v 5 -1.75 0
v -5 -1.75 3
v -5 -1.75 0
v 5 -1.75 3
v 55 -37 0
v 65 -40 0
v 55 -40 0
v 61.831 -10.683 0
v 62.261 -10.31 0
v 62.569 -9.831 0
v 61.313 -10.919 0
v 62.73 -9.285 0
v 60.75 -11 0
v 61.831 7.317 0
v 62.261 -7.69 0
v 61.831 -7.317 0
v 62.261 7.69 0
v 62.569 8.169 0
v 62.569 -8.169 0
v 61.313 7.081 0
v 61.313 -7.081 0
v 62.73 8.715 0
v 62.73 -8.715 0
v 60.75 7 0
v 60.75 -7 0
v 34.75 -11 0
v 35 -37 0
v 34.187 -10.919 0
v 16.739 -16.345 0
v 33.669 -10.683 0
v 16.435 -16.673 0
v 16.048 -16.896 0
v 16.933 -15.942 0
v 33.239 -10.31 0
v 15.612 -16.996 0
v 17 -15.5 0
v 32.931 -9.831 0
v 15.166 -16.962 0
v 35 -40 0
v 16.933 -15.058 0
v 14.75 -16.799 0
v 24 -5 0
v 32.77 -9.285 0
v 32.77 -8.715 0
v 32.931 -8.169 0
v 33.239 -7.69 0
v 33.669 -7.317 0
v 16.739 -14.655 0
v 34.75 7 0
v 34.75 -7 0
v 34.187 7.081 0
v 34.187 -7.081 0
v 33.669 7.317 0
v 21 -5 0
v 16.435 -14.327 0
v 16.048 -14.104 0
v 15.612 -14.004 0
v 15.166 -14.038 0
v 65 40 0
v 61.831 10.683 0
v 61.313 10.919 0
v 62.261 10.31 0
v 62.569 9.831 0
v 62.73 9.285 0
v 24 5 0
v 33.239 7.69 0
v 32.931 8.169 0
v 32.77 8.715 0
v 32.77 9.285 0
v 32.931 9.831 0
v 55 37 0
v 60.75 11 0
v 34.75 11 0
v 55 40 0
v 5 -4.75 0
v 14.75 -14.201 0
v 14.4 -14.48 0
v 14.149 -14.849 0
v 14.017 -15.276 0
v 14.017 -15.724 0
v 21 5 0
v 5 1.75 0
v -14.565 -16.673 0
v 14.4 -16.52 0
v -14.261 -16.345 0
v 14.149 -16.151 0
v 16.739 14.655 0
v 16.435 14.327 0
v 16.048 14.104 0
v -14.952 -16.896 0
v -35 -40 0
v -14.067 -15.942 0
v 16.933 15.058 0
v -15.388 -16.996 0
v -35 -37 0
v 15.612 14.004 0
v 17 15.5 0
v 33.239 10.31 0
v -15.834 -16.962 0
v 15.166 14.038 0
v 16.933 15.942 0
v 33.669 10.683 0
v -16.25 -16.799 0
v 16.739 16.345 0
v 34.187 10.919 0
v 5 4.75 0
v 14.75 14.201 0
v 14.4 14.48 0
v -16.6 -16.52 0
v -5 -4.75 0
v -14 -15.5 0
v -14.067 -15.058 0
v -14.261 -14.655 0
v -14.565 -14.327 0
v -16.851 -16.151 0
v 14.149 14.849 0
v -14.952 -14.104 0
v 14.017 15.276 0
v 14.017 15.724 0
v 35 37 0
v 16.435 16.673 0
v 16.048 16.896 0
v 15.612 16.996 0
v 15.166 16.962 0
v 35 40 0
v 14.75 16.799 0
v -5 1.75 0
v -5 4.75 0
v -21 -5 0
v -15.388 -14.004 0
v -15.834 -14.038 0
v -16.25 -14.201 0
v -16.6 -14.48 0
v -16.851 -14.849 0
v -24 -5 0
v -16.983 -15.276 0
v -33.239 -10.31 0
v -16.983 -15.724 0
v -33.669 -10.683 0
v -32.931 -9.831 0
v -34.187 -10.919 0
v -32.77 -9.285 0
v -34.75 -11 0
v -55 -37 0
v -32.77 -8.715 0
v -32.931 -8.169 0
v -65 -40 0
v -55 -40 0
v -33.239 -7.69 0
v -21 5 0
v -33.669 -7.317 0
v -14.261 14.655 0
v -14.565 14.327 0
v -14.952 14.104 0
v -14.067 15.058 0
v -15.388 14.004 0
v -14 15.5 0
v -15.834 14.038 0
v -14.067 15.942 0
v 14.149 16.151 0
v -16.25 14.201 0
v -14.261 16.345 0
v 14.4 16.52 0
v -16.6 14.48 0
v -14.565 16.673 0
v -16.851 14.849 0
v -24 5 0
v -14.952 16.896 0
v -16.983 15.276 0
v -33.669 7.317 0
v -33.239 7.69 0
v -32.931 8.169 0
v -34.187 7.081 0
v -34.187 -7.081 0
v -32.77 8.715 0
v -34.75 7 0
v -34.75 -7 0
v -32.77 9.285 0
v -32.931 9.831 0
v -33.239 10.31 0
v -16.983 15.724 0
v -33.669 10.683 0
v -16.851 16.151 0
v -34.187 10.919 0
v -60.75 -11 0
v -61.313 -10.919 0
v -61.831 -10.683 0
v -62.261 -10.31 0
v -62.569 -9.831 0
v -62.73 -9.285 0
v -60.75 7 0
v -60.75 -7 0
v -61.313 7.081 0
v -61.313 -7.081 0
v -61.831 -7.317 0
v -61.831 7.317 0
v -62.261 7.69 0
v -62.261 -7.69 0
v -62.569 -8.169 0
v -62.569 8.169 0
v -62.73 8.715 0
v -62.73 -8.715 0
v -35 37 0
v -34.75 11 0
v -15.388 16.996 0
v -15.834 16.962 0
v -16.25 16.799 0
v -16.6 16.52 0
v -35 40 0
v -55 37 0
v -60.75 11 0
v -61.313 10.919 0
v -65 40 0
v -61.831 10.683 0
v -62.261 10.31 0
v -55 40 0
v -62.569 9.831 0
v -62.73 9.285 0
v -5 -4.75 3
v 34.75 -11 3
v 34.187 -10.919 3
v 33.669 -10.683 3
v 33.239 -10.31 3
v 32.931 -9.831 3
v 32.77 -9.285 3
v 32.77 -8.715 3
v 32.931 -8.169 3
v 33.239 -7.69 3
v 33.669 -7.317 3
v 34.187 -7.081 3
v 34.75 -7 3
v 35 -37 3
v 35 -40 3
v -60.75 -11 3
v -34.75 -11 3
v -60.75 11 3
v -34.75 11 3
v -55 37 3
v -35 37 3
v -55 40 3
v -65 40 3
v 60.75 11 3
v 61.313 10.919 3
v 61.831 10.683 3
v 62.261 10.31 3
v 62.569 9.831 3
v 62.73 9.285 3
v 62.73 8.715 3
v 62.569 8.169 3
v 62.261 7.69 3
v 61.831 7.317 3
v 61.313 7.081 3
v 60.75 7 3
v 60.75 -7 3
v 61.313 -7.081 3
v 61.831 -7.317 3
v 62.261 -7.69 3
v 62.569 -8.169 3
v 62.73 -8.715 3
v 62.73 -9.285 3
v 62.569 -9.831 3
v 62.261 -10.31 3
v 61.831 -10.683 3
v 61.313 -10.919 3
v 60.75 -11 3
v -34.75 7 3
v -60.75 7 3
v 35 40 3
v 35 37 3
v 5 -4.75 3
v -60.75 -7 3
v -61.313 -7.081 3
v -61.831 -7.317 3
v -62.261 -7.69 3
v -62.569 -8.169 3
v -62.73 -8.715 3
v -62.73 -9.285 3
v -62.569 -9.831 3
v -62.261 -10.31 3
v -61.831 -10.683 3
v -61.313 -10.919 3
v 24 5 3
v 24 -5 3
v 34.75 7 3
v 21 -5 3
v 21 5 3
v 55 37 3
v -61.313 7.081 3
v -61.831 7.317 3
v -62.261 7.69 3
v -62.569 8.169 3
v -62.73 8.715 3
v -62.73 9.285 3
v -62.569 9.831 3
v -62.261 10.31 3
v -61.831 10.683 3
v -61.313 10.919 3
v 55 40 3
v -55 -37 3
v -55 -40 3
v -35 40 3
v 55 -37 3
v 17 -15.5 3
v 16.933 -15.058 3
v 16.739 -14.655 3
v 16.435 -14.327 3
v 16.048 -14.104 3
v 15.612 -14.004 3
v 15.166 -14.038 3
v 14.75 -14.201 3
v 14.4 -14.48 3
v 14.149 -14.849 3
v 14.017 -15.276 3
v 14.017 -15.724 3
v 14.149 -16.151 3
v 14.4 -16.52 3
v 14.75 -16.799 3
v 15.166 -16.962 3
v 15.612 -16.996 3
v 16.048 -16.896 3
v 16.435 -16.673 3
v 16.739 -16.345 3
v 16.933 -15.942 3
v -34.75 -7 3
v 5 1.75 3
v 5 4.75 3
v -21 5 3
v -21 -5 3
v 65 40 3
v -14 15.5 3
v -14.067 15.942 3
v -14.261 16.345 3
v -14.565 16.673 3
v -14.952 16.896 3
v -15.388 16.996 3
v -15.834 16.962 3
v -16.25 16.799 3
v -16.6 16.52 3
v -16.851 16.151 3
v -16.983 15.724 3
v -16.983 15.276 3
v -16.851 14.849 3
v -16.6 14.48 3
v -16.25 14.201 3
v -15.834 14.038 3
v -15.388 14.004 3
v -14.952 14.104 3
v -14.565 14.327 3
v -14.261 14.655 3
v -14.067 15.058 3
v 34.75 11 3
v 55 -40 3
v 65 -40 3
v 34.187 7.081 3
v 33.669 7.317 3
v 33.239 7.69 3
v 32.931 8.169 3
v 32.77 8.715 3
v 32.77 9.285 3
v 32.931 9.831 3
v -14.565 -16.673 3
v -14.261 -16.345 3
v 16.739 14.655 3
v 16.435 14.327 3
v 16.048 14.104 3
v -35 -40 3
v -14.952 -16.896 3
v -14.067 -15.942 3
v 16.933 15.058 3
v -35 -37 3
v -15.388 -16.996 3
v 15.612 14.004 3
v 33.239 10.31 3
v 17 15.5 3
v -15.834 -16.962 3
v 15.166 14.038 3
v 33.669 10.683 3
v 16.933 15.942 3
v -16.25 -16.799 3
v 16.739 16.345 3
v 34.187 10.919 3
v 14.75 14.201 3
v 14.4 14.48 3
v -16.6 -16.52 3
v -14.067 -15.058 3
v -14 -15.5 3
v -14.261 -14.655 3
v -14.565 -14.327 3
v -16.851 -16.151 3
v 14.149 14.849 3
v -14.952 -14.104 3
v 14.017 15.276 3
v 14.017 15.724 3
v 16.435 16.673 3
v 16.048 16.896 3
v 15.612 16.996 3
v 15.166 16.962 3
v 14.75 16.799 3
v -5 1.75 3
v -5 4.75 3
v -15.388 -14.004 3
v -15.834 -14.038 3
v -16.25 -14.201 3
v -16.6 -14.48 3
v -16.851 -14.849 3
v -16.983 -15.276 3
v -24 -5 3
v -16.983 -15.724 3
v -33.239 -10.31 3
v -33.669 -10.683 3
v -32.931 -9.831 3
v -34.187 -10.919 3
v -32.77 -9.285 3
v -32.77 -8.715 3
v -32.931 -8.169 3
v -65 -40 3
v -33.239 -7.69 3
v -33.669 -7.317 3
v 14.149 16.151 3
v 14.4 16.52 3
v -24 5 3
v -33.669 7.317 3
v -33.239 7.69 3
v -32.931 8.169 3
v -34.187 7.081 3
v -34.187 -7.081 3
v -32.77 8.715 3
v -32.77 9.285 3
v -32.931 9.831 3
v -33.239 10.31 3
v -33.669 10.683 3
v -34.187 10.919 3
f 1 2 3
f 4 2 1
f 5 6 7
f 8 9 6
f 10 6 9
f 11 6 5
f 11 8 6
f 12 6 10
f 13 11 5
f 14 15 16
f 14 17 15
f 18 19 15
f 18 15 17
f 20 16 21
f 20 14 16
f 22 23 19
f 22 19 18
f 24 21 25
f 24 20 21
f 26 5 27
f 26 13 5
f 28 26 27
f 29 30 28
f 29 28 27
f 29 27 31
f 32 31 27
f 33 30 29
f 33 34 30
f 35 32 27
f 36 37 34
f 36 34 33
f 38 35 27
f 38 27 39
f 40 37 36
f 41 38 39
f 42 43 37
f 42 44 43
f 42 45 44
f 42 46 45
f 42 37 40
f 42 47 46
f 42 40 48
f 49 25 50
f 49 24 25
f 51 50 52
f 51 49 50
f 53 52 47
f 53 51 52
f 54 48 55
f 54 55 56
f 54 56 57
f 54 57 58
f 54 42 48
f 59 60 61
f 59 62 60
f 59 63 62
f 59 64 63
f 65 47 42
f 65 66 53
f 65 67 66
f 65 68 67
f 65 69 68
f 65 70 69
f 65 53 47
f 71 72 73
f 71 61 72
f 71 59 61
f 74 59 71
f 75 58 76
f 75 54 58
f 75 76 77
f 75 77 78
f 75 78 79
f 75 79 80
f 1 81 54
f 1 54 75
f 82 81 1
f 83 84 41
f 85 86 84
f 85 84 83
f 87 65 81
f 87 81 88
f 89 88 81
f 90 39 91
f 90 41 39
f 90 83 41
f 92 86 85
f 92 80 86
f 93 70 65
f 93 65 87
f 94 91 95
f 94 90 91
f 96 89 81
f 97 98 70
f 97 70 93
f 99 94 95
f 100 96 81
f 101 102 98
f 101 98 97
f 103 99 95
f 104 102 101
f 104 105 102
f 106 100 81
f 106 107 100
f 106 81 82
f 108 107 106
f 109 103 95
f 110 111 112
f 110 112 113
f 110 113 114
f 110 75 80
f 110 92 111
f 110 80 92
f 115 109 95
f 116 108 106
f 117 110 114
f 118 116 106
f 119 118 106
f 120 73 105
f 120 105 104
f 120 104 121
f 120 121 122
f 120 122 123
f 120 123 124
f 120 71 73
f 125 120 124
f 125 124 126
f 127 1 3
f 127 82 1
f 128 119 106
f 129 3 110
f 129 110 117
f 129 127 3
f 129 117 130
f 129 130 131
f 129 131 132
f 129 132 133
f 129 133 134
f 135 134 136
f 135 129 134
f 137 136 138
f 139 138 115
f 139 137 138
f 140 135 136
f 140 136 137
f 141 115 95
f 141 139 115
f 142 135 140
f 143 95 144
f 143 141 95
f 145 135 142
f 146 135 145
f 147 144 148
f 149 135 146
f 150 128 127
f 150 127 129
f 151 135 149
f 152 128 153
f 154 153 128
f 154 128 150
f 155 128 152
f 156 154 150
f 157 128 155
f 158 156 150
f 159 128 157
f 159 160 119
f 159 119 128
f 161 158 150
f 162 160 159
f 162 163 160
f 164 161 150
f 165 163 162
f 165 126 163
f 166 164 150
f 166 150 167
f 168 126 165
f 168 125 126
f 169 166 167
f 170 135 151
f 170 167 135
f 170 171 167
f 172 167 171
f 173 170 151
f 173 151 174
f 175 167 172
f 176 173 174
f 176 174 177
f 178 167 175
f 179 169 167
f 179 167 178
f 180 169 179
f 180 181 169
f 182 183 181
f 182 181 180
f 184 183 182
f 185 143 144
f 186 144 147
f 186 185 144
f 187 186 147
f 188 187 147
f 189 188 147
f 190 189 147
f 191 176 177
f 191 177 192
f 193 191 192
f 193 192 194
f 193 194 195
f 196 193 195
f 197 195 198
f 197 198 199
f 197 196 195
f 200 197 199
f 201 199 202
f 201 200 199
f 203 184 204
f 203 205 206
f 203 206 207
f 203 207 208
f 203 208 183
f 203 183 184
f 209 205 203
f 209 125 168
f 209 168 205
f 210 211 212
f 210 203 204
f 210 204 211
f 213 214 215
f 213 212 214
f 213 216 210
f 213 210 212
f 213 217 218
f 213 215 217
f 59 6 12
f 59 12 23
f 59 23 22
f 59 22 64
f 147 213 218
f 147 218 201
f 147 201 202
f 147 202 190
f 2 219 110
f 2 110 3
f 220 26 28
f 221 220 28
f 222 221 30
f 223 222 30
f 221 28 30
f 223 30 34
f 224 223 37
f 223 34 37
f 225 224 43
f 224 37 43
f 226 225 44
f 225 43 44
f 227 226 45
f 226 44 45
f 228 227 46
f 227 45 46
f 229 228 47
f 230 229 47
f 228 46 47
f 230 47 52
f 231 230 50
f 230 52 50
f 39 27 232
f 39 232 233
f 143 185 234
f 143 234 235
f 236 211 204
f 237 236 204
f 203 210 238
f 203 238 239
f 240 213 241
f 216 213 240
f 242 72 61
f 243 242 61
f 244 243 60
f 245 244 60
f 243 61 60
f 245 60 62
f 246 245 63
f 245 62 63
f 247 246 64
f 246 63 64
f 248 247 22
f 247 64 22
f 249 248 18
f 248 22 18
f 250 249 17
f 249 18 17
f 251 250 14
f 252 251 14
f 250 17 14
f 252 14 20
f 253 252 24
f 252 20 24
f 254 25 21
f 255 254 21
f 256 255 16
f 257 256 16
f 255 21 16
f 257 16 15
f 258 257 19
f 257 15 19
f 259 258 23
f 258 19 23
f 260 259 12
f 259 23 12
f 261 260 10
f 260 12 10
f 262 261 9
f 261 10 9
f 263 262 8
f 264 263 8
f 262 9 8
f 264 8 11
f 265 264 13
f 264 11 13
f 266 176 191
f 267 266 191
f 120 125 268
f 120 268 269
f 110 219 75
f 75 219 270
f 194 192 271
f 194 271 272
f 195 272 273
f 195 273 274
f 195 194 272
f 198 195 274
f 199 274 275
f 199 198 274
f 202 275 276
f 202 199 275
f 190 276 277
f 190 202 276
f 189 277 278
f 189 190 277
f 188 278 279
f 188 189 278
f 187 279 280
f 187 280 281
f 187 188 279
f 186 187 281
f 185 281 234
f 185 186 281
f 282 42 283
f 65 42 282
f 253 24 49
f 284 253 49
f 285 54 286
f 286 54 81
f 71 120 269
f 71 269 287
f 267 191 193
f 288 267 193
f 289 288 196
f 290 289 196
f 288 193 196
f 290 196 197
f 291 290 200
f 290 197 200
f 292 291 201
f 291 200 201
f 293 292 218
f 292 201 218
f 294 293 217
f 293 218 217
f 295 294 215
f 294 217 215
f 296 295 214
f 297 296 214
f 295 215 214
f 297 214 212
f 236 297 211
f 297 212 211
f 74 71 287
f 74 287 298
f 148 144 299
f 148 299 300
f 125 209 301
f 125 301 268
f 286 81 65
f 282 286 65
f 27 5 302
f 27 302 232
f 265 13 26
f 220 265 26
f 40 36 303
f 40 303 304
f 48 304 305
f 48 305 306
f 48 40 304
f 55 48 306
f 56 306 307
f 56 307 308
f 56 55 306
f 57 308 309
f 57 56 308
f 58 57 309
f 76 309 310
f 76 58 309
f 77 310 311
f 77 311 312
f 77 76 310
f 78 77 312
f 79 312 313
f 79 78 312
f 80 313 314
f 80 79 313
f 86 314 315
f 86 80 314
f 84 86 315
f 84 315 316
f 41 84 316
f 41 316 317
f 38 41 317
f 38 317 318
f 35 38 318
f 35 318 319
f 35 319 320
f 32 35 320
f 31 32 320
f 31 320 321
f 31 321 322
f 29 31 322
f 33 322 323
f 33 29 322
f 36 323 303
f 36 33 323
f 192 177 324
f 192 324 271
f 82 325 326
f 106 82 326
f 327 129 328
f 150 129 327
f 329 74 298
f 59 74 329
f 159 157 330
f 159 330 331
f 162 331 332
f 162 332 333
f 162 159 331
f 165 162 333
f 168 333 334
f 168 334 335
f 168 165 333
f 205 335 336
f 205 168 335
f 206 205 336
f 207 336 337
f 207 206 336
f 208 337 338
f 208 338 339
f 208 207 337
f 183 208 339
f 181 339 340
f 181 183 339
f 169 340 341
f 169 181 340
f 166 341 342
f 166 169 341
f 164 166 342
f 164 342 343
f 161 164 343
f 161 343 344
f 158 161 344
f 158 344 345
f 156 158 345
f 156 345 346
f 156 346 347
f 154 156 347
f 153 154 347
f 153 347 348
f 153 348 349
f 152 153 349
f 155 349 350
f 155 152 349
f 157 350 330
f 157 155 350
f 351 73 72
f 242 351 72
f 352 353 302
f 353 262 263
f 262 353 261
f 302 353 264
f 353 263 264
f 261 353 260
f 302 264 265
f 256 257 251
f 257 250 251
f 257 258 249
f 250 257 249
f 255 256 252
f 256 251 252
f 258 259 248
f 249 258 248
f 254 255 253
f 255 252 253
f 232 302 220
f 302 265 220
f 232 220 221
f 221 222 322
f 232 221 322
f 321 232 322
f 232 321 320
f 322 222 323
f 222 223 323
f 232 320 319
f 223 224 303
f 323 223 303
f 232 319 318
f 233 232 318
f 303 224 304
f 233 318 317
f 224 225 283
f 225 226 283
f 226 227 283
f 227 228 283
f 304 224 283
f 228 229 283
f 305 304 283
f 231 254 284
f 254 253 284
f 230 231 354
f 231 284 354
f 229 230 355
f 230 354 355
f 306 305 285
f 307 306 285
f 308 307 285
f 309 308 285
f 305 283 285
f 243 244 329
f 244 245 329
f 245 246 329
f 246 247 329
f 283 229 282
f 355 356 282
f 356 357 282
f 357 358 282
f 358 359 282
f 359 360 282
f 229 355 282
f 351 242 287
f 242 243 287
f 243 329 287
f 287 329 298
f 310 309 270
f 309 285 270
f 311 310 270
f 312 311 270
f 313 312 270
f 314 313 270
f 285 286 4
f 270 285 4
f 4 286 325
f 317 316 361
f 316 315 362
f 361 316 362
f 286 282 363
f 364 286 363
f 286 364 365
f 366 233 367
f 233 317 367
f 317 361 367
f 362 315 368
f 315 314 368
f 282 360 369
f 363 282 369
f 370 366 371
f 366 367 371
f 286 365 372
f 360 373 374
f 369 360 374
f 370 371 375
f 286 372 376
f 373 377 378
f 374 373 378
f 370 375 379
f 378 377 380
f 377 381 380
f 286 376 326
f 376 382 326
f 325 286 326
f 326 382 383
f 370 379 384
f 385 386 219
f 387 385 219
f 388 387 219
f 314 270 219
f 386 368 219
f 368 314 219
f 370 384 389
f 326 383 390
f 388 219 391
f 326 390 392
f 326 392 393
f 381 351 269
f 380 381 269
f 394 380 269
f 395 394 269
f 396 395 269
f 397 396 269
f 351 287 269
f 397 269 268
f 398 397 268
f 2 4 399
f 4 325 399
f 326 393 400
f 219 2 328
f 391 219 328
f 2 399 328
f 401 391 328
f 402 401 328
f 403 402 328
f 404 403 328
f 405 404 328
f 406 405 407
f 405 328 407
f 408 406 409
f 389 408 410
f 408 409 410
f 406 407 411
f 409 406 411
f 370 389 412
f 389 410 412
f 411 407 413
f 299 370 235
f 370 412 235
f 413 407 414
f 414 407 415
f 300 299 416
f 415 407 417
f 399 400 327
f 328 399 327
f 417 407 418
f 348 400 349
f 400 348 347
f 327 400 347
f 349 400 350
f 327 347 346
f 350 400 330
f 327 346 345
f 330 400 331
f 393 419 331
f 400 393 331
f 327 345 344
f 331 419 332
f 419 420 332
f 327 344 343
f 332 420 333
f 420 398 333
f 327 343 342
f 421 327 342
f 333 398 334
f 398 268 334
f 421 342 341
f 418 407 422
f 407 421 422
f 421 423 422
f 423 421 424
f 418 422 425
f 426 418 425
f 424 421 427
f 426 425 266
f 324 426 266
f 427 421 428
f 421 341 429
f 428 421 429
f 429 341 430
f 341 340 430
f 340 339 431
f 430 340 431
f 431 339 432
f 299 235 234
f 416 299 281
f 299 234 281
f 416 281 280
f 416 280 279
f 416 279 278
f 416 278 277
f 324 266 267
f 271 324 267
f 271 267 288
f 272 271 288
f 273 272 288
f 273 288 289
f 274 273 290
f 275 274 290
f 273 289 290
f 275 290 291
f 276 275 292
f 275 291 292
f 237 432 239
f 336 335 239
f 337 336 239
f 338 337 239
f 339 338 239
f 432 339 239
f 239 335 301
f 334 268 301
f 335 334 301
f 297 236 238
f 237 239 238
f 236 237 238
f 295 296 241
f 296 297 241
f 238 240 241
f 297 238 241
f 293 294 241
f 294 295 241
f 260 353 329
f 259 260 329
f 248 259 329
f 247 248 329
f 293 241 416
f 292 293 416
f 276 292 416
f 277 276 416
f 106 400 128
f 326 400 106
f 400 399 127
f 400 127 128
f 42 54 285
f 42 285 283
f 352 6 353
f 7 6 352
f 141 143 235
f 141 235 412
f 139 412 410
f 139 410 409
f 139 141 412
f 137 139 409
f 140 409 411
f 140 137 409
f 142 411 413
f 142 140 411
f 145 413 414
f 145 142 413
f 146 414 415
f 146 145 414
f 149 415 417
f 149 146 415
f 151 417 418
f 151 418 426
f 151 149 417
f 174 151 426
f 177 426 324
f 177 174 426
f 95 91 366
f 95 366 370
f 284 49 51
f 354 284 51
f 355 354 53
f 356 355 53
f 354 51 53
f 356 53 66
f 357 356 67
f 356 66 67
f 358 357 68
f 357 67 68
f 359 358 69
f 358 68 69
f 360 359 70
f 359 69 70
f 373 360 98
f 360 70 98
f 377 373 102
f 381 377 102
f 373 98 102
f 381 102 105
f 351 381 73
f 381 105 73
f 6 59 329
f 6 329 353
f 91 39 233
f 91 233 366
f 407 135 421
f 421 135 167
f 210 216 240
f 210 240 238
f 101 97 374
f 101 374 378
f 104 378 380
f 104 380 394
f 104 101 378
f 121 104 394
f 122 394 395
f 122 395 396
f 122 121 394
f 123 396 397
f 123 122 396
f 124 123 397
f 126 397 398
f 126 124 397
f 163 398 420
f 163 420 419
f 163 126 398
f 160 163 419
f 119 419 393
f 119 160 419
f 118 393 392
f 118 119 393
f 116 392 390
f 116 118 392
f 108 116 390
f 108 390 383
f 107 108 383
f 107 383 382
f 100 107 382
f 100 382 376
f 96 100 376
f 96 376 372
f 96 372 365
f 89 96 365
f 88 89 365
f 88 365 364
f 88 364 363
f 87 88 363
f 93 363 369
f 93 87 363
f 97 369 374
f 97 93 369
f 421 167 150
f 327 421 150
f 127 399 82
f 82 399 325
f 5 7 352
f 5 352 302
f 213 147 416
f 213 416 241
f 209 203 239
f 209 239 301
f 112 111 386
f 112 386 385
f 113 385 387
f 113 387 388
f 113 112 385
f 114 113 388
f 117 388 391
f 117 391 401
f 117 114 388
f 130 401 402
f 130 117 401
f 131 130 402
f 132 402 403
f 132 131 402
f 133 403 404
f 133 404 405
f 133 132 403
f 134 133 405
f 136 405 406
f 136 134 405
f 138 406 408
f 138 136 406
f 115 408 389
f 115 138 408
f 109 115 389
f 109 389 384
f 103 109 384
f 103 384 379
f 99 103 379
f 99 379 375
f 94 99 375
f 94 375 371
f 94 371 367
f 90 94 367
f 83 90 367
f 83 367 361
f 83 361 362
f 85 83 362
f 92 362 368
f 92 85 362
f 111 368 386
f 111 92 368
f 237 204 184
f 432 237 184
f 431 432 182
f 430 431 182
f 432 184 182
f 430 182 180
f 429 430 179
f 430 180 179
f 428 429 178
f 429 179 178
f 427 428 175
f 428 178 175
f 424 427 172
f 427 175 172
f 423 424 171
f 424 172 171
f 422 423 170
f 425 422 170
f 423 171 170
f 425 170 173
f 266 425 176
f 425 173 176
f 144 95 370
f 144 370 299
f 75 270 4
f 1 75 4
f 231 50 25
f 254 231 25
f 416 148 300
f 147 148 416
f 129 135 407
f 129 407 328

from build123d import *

# Parameters (mm, degrees)
SKETCH1_R           = 1.5
SKETCH1_W           = 3
SKETCH1_H           = 10
BOSS_EXTRUDE1_DEPTH = 3
SKETCH2_W           = 10
SKETCH2_H           = 3
CUT_EXTRUDE2_DEPTH  = 3


with BuildPart() as part:
    # Sketch1 → Boss-Extrude1 (new body)
    with BuildSketch(Plane.XY):
        Polygon((-55, 40), (-55, 37), (-35, 37), (-35, 40), (35, 40), (35, 37), (55, 37), (55, 40), (65, 40), (65, -40), (55, -40), (55, -37), (35, -37), (35, -40), (-35, -40), (-35, -37), (-55, -37), (-55, -40), (-65, -40), (-65, 40), align=None)
        with Locations((15.5, 15.5)):
            Circle(SKETCH1_R, mode=Mode.SUBTRACT)
        with Locations((-15.5, 15.5)):
            Circle(SKETCH1_R, mode=Mode.SUBTRACT)
        with Locations((15.5, -15.5)):
            Circle(SKETCH1_R, mode=Mode.SUBTRACT)
        with Locations((-15.5, -15.5)):
            Circle(SKETCH1_R, mode=Mode.SUBTRACT)
        with Locations((22.5, 0)):
            Rectangle(SKETCH1_W, SKETCH1_H, mode=Mode.SUBTRACT)
        with Locations((-22.5, 0)):
            Rectangle(SKETCH1_W, SKETCH1_H, mode=Mode.SUBTRACT)
        with BuildLine():
            Line((-60.75, 11), (-34.75, 11))
            ThreePointArc((-34.75, 11), (-32.75, 9), (-34.75, 7))
            Line((-34.75, 7), (-60.75, 7))
            ThreePointArc((-60.75, 7), (-62.75, 9), (-60.75, 11))
        make_face(mode=Mode.SUBTRACT)
        with BuildLine():
            Line((-34.75, -7), (-60.75, -7))
            ThreePointArc((-60.75, -7), (-62.75, -9), (-60.75, -11))
            Line((-60.75, -11), (-34.75, -11))
            ThreePointArc((-34.75, -11), (-32.75, -9), (-34.75, -7))
        make_face(mode=Mode.SUBTRACT)
        with BuildLine():
            Line((34.75, 11), (60.75, 11))
            ThreePointArc((60.75, 11), (62.75, 9), (60.75, 7))
            Line((60.75, 7), (34.75, 7))
            ThreePointArc((34.75, 7), (32.75, 9), (34.75, 11))
        make_face(mode=Mode.SUBTRACT)
        with BuildLine():
            Line((34.75, -7), (60.75, -7))
            ThreePointArc((60.75, -7), (62.75, -9), (60.75, -11))
            Line((60.75, -11), (34.75, -11))
            ThreePointArc((34.75, -11), (32.75, -9), (34.75, -7))
        make_face(mode=Mode.SUBTRACT)
    extrude(amount=BOSS_EXTRUDE1_DEPTH)

    # Sketch2 → Cut-Extrude2 (cut)
    with BuildSketch(Plane.XY.offset(3)):
        with Locations((0, 3.25)):
            Rectangle(SKETCH2_W, SKETCH2_H)
        with Locations((0, -3.25)):
            Rectangle(SKETCH2_W, SKETCH2_H)
    extrude(amount=-CUT_EXTRUDE2_DEPTH, mode=Mode.SUBTRACT)


solid = part.part
